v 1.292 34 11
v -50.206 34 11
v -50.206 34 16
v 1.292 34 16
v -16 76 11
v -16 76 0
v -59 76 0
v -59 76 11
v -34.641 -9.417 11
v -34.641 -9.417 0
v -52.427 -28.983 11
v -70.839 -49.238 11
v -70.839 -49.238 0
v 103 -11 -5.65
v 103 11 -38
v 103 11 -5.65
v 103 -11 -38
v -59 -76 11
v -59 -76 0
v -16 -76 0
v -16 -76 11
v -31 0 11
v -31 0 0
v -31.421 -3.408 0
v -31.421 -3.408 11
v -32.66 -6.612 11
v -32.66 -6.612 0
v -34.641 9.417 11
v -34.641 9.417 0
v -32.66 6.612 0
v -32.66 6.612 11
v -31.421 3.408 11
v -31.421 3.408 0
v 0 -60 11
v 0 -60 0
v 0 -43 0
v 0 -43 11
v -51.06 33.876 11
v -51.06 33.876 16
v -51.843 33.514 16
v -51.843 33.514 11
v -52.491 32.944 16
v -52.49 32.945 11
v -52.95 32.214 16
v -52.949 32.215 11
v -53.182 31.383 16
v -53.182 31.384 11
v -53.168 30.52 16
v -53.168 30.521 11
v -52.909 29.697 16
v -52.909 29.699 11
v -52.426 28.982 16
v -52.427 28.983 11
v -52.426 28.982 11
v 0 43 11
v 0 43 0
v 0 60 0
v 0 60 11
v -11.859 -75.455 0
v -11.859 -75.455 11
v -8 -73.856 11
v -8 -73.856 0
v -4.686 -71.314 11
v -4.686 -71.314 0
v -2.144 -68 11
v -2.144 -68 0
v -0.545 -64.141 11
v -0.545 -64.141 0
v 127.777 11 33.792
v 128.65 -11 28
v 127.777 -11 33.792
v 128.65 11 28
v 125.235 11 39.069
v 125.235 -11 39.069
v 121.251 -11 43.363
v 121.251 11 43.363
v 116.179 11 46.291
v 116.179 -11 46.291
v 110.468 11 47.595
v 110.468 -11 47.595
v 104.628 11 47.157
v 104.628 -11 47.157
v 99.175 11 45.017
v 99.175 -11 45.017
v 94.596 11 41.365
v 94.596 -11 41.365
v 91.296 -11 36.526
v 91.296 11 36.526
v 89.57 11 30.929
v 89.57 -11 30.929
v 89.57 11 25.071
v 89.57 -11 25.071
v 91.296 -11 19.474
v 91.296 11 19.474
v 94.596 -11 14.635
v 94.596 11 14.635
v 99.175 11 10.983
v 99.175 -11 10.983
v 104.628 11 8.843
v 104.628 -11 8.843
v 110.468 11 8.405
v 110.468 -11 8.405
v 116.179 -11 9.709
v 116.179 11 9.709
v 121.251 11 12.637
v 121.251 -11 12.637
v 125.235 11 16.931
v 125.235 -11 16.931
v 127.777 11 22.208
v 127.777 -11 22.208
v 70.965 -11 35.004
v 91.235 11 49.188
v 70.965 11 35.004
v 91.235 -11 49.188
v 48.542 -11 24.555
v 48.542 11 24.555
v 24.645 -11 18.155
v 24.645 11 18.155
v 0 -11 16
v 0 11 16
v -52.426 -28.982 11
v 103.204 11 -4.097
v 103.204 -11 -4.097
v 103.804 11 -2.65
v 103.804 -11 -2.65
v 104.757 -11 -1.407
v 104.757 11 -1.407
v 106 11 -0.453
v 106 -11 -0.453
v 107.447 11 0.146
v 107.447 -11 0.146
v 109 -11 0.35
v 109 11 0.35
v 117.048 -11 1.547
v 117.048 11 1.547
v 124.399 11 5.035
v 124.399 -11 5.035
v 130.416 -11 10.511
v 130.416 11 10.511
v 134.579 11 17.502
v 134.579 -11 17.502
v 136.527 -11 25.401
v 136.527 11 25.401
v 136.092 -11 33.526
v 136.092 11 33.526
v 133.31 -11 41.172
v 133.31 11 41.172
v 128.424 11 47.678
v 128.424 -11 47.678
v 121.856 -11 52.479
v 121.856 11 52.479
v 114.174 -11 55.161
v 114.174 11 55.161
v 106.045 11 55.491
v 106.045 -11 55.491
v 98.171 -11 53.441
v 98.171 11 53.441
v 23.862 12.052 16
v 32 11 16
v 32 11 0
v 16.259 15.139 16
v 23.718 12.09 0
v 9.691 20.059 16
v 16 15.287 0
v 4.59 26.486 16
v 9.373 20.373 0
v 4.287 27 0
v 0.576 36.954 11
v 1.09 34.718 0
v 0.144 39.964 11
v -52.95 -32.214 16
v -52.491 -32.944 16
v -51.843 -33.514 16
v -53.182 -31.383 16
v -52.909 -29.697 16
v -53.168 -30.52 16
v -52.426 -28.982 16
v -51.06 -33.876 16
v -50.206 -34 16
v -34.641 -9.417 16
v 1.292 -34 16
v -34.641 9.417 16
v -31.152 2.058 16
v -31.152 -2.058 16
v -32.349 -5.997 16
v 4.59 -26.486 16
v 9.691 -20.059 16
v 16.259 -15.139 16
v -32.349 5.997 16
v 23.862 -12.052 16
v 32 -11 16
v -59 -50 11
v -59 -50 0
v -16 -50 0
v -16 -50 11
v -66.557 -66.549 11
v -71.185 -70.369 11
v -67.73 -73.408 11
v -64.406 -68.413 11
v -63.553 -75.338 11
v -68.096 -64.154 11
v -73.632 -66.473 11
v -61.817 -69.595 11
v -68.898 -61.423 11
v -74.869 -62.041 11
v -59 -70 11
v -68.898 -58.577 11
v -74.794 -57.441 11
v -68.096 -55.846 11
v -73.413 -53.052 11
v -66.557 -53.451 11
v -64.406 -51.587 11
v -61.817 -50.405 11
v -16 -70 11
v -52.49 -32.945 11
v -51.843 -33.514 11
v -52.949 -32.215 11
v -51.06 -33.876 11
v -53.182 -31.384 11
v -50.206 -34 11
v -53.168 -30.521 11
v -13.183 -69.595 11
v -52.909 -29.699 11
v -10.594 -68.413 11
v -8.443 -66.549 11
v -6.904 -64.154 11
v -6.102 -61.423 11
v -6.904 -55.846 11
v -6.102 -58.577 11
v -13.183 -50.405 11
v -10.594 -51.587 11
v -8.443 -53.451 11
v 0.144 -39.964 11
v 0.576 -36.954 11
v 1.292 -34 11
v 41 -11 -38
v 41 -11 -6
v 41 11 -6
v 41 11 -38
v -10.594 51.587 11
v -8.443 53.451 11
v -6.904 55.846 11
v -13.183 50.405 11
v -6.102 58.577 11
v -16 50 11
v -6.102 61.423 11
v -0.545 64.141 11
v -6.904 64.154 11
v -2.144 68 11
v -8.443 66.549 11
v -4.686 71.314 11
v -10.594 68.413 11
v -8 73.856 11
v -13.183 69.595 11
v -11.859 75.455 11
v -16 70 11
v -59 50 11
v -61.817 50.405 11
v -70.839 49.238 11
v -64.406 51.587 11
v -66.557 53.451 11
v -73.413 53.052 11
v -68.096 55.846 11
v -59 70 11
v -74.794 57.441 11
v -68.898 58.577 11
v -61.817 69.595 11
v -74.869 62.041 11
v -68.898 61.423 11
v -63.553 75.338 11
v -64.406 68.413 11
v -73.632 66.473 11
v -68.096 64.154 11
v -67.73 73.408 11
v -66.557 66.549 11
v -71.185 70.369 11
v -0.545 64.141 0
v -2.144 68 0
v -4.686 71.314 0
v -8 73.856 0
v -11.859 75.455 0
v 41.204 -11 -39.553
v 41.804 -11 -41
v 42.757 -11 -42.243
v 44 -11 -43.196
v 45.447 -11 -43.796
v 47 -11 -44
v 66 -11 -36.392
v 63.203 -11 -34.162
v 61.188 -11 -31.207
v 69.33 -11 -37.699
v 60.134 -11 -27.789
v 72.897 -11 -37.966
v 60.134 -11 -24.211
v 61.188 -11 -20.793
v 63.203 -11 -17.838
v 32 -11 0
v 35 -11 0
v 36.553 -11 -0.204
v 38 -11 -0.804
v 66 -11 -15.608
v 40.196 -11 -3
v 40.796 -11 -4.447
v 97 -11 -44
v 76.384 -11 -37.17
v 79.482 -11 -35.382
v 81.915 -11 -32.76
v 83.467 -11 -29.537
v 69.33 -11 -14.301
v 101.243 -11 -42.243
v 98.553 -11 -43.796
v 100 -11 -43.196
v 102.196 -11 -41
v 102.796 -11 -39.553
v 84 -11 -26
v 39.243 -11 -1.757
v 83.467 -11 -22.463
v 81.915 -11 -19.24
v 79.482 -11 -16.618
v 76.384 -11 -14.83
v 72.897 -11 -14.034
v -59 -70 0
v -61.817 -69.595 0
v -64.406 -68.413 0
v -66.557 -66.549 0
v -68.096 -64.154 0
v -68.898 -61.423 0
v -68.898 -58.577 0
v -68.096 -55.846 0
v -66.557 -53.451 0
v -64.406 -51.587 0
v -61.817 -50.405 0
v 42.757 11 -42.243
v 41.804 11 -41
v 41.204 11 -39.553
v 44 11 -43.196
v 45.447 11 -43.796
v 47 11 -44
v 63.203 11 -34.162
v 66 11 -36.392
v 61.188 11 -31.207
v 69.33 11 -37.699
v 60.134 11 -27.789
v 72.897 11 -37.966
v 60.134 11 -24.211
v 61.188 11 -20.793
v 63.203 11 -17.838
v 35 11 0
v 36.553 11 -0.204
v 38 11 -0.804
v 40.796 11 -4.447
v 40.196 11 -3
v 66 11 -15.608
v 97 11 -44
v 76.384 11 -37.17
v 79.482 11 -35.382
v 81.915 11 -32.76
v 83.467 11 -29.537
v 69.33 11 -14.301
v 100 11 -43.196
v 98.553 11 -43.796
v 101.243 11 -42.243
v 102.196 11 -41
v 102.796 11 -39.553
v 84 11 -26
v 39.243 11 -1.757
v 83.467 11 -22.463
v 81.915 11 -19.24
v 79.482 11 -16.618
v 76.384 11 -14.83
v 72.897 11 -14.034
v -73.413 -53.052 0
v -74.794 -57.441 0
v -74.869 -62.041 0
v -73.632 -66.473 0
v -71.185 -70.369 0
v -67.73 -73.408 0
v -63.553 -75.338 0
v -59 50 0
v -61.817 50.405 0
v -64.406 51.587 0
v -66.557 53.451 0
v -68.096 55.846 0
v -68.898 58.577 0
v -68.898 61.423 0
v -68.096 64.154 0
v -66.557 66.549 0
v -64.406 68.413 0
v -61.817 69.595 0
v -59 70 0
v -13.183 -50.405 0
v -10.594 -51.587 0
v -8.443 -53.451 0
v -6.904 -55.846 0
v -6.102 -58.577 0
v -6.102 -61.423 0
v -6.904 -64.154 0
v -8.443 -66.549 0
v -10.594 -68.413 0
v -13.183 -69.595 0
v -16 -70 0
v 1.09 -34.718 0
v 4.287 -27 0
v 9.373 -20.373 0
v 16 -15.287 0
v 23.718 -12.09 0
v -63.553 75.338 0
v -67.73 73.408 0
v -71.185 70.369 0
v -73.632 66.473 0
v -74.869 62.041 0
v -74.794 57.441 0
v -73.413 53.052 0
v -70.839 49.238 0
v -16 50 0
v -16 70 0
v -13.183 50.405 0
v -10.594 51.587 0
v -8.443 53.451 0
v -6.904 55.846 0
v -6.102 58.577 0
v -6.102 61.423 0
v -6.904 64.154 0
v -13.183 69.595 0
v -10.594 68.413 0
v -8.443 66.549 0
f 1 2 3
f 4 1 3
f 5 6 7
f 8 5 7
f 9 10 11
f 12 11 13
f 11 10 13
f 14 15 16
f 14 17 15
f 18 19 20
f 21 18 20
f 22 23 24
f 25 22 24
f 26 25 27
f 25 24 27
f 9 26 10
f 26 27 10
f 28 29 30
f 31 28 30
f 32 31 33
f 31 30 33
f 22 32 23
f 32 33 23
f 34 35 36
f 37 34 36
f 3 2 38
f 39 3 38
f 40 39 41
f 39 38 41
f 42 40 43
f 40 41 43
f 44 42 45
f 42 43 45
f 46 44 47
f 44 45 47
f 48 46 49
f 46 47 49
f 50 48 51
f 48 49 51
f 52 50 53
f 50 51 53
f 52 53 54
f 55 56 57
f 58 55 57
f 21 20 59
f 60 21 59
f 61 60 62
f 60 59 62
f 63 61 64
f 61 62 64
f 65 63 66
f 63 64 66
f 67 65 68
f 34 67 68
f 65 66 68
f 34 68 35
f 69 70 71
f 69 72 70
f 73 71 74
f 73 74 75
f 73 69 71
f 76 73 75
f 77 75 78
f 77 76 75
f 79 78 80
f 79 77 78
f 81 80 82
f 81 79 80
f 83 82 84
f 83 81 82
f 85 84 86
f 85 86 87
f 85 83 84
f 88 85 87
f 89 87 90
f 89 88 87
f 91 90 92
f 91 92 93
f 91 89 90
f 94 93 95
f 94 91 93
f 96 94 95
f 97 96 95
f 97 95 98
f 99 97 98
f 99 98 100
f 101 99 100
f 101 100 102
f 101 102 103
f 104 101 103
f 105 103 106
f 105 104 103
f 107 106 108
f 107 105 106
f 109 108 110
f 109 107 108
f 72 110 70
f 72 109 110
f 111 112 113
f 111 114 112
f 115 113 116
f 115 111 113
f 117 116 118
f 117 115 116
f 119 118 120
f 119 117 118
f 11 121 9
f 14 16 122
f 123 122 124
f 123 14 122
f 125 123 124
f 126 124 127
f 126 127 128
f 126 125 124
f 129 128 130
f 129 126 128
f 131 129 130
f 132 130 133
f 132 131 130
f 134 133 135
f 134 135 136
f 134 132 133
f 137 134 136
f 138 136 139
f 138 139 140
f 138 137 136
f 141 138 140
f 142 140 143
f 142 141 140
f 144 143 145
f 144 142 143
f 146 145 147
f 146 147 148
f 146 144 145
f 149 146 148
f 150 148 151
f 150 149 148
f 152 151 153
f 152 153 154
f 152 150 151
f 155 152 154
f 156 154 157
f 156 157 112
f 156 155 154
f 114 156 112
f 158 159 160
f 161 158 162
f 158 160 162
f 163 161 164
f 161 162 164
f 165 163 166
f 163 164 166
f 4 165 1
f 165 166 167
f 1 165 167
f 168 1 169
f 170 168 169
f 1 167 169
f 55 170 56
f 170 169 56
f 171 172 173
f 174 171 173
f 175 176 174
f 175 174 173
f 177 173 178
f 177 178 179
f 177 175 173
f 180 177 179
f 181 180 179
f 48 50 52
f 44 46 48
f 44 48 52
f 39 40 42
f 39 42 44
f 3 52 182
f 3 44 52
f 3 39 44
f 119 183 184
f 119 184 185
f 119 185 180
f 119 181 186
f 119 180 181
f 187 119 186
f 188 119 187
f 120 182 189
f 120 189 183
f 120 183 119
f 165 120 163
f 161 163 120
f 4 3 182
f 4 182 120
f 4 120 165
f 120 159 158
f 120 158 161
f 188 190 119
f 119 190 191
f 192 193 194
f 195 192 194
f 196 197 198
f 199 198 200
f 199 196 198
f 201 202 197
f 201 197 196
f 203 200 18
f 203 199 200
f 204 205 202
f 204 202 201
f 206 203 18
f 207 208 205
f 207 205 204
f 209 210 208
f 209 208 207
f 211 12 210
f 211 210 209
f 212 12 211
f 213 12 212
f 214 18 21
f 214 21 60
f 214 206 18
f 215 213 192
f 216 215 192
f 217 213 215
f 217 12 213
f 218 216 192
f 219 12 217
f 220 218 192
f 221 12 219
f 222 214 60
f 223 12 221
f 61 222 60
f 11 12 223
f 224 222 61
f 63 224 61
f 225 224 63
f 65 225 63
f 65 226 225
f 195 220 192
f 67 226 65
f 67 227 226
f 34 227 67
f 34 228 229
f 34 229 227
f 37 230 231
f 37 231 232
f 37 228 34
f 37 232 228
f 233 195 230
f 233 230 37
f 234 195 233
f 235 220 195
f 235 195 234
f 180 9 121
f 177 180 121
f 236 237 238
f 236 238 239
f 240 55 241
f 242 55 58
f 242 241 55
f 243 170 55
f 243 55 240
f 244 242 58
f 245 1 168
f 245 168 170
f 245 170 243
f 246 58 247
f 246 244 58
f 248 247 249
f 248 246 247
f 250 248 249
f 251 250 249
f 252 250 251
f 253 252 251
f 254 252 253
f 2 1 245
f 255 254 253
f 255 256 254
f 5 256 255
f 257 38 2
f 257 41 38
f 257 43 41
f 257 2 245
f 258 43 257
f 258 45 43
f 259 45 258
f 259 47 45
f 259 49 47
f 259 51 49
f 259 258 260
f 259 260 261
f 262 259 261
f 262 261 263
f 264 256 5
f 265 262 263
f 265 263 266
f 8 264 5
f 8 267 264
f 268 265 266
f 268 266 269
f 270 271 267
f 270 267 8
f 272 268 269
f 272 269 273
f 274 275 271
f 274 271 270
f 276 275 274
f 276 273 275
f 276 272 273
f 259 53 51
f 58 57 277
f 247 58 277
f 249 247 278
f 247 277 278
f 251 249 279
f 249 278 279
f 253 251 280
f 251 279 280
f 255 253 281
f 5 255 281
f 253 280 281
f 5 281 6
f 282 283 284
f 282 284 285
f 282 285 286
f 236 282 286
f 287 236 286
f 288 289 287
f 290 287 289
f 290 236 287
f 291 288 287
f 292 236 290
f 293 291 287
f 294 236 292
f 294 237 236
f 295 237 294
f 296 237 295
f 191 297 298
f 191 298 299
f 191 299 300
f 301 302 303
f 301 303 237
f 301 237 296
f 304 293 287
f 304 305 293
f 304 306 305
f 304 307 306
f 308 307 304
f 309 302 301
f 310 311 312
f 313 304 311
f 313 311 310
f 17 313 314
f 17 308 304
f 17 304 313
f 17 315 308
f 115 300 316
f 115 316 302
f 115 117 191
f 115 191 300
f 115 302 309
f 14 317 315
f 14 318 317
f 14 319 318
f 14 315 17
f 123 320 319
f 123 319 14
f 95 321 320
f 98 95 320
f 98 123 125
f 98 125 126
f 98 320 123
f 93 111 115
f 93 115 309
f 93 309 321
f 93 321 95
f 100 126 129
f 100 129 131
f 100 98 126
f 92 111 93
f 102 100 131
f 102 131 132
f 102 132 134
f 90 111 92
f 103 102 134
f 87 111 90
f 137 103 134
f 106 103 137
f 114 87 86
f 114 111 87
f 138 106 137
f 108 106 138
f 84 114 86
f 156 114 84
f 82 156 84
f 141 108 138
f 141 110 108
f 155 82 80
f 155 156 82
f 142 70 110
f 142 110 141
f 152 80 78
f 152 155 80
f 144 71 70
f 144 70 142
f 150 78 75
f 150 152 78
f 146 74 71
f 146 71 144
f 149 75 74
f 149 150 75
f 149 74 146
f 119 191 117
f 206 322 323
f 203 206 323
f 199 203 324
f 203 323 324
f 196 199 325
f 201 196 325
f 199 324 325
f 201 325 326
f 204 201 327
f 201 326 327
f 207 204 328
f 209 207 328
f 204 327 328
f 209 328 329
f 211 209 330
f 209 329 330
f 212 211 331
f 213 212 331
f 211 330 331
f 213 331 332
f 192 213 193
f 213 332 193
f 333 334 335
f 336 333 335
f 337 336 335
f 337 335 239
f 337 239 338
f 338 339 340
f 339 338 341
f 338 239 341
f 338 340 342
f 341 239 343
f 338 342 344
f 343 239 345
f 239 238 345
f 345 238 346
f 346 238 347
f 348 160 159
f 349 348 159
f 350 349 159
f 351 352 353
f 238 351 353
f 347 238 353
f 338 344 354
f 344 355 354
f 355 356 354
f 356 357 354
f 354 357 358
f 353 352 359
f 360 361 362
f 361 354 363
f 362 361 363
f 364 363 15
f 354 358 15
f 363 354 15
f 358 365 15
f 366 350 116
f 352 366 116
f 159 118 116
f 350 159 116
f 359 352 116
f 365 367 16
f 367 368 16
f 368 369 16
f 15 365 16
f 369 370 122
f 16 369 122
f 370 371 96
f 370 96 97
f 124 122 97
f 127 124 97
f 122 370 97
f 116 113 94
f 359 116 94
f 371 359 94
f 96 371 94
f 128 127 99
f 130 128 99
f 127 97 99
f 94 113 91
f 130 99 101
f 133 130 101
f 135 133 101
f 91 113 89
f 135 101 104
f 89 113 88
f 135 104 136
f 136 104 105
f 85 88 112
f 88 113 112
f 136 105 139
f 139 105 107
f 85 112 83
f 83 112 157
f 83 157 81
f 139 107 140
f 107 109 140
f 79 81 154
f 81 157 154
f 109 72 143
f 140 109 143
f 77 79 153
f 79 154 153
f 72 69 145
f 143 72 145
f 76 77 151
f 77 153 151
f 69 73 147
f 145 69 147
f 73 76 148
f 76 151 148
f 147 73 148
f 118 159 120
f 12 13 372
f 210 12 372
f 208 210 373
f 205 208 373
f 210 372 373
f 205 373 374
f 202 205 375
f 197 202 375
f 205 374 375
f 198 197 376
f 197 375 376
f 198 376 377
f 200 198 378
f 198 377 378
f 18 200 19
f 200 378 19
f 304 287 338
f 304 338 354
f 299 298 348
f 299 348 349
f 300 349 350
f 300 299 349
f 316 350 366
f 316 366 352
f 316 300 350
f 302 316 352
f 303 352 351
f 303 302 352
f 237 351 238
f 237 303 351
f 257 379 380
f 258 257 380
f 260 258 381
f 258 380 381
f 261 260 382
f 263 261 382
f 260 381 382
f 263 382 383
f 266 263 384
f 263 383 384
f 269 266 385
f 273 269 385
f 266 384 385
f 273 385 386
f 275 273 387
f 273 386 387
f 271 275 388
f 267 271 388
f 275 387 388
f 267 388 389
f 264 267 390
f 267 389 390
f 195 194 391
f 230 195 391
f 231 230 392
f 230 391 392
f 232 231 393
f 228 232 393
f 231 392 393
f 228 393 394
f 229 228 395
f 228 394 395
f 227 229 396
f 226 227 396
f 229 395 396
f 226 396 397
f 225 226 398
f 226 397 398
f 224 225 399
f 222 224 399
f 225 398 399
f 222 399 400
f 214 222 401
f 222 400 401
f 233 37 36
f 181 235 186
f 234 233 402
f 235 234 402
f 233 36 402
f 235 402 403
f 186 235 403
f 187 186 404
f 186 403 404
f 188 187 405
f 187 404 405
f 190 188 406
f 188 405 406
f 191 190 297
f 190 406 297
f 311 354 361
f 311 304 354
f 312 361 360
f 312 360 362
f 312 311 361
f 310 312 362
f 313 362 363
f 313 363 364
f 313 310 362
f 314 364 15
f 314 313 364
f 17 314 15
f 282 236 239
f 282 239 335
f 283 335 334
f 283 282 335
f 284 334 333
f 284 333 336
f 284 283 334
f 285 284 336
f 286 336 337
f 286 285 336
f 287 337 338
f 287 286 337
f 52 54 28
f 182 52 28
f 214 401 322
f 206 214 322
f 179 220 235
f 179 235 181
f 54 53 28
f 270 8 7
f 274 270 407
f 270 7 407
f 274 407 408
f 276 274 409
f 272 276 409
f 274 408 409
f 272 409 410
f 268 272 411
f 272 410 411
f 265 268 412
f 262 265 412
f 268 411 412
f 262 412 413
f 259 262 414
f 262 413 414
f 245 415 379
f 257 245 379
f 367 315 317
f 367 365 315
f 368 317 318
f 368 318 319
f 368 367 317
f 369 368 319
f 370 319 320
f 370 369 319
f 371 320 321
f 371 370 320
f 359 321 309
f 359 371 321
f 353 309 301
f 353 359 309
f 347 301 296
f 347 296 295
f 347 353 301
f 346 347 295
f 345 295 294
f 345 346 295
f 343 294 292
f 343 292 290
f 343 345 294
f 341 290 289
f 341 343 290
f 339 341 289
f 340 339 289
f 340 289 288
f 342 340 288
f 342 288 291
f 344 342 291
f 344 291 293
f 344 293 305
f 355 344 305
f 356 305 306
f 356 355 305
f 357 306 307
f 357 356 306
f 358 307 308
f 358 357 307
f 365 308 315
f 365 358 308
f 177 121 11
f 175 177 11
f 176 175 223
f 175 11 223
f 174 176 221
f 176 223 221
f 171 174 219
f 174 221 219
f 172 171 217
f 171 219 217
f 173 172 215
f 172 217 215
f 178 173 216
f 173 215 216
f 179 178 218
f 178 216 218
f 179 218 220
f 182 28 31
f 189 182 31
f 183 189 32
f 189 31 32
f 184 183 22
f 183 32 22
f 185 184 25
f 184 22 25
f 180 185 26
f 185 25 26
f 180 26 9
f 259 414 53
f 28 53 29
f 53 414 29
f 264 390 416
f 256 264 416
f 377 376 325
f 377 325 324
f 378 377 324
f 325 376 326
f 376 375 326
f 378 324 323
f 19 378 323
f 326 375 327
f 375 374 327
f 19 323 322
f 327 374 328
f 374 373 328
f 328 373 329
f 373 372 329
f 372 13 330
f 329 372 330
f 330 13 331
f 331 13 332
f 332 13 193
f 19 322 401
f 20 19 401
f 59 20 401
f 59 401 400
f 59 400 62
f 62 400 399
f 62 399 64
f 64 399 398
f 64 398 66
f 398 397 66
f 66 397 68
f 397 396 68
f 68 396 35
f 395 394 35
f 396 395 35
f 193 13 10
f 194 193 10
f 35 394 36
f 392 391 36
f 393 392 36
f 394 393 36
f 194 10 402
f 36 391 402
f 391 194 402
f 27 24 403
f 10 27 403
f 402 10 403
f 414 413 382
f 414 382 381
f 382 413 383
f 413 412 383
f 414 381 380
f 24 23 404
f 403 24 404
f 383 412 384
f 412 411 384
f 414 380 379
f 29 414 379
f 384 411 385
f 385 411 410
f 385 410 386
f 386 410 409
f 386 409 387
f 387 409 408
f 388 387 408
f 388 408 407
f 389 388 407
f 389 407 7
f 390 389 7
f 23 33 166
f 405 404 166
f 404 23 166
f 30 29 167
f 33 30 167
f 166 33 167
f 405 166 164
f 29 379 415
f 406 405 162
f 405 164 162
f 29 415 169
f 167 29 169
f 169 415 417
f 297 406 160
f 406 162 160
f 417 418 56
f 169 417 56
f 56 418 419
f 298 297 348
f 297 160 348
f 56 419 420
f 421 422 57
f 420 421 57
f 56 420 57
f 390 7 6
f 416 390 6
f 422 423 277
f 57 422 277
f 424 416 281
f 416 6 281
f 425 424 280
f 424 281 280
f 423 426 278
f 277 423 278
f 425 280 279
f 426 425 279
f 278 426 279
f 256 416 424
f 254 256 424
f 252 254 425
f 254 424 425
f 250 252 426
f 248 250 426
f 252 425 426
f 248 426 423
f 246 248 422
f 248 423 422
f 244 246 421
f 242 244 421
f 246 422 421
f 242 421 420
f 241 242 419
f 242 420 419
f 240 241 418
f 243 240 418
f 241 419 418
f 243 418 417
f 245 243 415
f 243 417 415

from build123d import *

# Parameters (mm, degrees)
F1_DEPTH = 11
F3_DEPTH = 5
F4_R     = 12
F4_R_2   = 19.649639
F5_DEPTH = 11
F7_DEPTH = 16
F8_W     = 9
F8_H     = 5
F9_DEPTH = 136.650639


with BuildPart() as f1:
    # F0 (on Top) → F1 (new body)
    with BuildSketch(Plane.XY):
        with BuildLine():
            Line((-16, 76), (-59, 76))
            ThreePointArc((-59, 76), (-73.632156, 66.473021), (-70.839282, 49.237501))
            Line((-70.839282, 49.237501), (-34.640628, 9.417187))
            ThreePointArc((-34.640628, 9.417187), (-31.941838, 5.048207), (-31, 0))
            ThreePointArc((-31, 0), (-31.941838, -5.048207), (-34.640628, -9.417187))
            Line((-34.640628, -9.417187), (-70.839282, -49.237501))
            ThreePointArc((-70.839282, -49.237501), (-73.632156, -66.473021), (-59, -76))
            Line((-59, -76), (-16, -76))
            ThreePointArc((-16, -76), (-4.686292, -71.313708), (0, -60))
            Line((0, -60), (0, 0))
            Line((0, 0), (0, 60))
            ThreePointArc((0, 60), (-4.686292, 71.313708), (-16, 76))
        make_face()
        with BuildLine():
            Line((-59, -50), (-16, -50))
            ThreePointArc((-16, -50), (-6, -60), (-16, -70))
            Line((-16, -70), (-59, -70))
            ThreePointArc((-59, -70), (-69, -60), (-59, -50))
        make_face(mode=Mode.SUBTRACT)
        with BuildLine():
            ThreePointArc((-59, 50), (-69, 60), (-59, 70))
            Line((-59, 70), (-16, 70))
            ThreePointArc((-16, 70), (-6, 60), (-16, 50))
            Line((-16, 50), (-59, 50))
        make_face(mode=Mode.SUBTRACT)
    extrude(amount=F1_DEPTH)

    # F2 (on face) → F3 (join)
    with BuildSketch(Plane.XY.offset(11)):
        with BuildLine():
            ThreePointArc((-50.206183, 34), (-52.949713, 32.213692), (-52.426049, 28.982031))
            Line((-52.426049, 28.982031), (-34.640628, 9.417187))
            ThreePointArc((-34.640628, 9.417187), (-31, 0), (-34.640628, -9.417187))
            Line((-34.640628, -9.417187), (-52.426049, -28.982031))
            ThreePointArc((-52.426049, -28.982031), (-52.949713, -32.213692), (-50.206183, -34))
            Line((-50.206183, -34), (0, -34))
            Line((0, -34), (0, 34))
            Line((0, 34), (-50.206183, 34))
        make_face()
    extrude(amount=F3_DEPTH)

    # F4 (on Front) → F5 (join, symmetric)
    with BuildSketch(Plane.XZ):
        with BuildLine():
            Line((0, 16), (0, 0))
            Line((0, 0), (35, 0))
            ThreePointArc((35, 0), (39.242641, -1.757359), (41, -6))
            Line((41, -6), (41, -38))
            ThreePointArc((41, -38), (42.757359, -42.242641), (47, -44))
            Line((47, -44), (97, -44))
            ThreePointArc((97, -44), (101.242641, -42.242641), (103, -38))
            Line((103, -38), (103, -5.649639))
            ThreePointArc((103, -5.649639), (104.757359, -1.406998), (109, 0.350361))
            ThreePointArc((109, 0.350361), (134.983932, 37.451867), (91.23509, 49.187508))
            ThreePointArc((91.23509, 49.187508), (48.541869, 24.554554), (0, 16))
        make_face()
        with Locations((72, -26)):
            Circle(F4_R, mode=Mode.SUBTRACT)
        with Locations((109, 28)):
            Circle(F4_R_2, mode=Mode.SUBTRACT)
    extrude(amount=F5_DEPTH, both=True)

    # F6 (on Top) → F7 (join, through all)
    with BuildSketch(Plane.XY):
        with BuildLine():
            ThreePointArc((32, 11), (9.372583, 20.372583), (0, 43))
            Line((0, 43), (0, 34))
            Line((0, 34), (0, 11))
            Line((0, 11), (32, 11))
        make_face()
        with BuildLine():
            Line((0, -34), (0, -43))
            ThreePointArc((0, -43), (9.372583, -20.372583), (32, -11))
            Line((32, -11), (0, -11))
            Line((0, -11), (0, -34))
        make_face()
    extrude(amount=F7_DEPTH)

    # F8 (on Right) → F9 (cut, through all)
    with BuildSketch(Plane.YZ):
        with Locations((38.5, 13.5)):
            Rectangle(F8_W, F8_H)
        with Locations((-38.5, 13.5)):
            Rectangle(F8_W, F8_H)
    extrude(amount=F9_DEPTH, mode=Mode.SUBTRACT)


solid = f1.part
